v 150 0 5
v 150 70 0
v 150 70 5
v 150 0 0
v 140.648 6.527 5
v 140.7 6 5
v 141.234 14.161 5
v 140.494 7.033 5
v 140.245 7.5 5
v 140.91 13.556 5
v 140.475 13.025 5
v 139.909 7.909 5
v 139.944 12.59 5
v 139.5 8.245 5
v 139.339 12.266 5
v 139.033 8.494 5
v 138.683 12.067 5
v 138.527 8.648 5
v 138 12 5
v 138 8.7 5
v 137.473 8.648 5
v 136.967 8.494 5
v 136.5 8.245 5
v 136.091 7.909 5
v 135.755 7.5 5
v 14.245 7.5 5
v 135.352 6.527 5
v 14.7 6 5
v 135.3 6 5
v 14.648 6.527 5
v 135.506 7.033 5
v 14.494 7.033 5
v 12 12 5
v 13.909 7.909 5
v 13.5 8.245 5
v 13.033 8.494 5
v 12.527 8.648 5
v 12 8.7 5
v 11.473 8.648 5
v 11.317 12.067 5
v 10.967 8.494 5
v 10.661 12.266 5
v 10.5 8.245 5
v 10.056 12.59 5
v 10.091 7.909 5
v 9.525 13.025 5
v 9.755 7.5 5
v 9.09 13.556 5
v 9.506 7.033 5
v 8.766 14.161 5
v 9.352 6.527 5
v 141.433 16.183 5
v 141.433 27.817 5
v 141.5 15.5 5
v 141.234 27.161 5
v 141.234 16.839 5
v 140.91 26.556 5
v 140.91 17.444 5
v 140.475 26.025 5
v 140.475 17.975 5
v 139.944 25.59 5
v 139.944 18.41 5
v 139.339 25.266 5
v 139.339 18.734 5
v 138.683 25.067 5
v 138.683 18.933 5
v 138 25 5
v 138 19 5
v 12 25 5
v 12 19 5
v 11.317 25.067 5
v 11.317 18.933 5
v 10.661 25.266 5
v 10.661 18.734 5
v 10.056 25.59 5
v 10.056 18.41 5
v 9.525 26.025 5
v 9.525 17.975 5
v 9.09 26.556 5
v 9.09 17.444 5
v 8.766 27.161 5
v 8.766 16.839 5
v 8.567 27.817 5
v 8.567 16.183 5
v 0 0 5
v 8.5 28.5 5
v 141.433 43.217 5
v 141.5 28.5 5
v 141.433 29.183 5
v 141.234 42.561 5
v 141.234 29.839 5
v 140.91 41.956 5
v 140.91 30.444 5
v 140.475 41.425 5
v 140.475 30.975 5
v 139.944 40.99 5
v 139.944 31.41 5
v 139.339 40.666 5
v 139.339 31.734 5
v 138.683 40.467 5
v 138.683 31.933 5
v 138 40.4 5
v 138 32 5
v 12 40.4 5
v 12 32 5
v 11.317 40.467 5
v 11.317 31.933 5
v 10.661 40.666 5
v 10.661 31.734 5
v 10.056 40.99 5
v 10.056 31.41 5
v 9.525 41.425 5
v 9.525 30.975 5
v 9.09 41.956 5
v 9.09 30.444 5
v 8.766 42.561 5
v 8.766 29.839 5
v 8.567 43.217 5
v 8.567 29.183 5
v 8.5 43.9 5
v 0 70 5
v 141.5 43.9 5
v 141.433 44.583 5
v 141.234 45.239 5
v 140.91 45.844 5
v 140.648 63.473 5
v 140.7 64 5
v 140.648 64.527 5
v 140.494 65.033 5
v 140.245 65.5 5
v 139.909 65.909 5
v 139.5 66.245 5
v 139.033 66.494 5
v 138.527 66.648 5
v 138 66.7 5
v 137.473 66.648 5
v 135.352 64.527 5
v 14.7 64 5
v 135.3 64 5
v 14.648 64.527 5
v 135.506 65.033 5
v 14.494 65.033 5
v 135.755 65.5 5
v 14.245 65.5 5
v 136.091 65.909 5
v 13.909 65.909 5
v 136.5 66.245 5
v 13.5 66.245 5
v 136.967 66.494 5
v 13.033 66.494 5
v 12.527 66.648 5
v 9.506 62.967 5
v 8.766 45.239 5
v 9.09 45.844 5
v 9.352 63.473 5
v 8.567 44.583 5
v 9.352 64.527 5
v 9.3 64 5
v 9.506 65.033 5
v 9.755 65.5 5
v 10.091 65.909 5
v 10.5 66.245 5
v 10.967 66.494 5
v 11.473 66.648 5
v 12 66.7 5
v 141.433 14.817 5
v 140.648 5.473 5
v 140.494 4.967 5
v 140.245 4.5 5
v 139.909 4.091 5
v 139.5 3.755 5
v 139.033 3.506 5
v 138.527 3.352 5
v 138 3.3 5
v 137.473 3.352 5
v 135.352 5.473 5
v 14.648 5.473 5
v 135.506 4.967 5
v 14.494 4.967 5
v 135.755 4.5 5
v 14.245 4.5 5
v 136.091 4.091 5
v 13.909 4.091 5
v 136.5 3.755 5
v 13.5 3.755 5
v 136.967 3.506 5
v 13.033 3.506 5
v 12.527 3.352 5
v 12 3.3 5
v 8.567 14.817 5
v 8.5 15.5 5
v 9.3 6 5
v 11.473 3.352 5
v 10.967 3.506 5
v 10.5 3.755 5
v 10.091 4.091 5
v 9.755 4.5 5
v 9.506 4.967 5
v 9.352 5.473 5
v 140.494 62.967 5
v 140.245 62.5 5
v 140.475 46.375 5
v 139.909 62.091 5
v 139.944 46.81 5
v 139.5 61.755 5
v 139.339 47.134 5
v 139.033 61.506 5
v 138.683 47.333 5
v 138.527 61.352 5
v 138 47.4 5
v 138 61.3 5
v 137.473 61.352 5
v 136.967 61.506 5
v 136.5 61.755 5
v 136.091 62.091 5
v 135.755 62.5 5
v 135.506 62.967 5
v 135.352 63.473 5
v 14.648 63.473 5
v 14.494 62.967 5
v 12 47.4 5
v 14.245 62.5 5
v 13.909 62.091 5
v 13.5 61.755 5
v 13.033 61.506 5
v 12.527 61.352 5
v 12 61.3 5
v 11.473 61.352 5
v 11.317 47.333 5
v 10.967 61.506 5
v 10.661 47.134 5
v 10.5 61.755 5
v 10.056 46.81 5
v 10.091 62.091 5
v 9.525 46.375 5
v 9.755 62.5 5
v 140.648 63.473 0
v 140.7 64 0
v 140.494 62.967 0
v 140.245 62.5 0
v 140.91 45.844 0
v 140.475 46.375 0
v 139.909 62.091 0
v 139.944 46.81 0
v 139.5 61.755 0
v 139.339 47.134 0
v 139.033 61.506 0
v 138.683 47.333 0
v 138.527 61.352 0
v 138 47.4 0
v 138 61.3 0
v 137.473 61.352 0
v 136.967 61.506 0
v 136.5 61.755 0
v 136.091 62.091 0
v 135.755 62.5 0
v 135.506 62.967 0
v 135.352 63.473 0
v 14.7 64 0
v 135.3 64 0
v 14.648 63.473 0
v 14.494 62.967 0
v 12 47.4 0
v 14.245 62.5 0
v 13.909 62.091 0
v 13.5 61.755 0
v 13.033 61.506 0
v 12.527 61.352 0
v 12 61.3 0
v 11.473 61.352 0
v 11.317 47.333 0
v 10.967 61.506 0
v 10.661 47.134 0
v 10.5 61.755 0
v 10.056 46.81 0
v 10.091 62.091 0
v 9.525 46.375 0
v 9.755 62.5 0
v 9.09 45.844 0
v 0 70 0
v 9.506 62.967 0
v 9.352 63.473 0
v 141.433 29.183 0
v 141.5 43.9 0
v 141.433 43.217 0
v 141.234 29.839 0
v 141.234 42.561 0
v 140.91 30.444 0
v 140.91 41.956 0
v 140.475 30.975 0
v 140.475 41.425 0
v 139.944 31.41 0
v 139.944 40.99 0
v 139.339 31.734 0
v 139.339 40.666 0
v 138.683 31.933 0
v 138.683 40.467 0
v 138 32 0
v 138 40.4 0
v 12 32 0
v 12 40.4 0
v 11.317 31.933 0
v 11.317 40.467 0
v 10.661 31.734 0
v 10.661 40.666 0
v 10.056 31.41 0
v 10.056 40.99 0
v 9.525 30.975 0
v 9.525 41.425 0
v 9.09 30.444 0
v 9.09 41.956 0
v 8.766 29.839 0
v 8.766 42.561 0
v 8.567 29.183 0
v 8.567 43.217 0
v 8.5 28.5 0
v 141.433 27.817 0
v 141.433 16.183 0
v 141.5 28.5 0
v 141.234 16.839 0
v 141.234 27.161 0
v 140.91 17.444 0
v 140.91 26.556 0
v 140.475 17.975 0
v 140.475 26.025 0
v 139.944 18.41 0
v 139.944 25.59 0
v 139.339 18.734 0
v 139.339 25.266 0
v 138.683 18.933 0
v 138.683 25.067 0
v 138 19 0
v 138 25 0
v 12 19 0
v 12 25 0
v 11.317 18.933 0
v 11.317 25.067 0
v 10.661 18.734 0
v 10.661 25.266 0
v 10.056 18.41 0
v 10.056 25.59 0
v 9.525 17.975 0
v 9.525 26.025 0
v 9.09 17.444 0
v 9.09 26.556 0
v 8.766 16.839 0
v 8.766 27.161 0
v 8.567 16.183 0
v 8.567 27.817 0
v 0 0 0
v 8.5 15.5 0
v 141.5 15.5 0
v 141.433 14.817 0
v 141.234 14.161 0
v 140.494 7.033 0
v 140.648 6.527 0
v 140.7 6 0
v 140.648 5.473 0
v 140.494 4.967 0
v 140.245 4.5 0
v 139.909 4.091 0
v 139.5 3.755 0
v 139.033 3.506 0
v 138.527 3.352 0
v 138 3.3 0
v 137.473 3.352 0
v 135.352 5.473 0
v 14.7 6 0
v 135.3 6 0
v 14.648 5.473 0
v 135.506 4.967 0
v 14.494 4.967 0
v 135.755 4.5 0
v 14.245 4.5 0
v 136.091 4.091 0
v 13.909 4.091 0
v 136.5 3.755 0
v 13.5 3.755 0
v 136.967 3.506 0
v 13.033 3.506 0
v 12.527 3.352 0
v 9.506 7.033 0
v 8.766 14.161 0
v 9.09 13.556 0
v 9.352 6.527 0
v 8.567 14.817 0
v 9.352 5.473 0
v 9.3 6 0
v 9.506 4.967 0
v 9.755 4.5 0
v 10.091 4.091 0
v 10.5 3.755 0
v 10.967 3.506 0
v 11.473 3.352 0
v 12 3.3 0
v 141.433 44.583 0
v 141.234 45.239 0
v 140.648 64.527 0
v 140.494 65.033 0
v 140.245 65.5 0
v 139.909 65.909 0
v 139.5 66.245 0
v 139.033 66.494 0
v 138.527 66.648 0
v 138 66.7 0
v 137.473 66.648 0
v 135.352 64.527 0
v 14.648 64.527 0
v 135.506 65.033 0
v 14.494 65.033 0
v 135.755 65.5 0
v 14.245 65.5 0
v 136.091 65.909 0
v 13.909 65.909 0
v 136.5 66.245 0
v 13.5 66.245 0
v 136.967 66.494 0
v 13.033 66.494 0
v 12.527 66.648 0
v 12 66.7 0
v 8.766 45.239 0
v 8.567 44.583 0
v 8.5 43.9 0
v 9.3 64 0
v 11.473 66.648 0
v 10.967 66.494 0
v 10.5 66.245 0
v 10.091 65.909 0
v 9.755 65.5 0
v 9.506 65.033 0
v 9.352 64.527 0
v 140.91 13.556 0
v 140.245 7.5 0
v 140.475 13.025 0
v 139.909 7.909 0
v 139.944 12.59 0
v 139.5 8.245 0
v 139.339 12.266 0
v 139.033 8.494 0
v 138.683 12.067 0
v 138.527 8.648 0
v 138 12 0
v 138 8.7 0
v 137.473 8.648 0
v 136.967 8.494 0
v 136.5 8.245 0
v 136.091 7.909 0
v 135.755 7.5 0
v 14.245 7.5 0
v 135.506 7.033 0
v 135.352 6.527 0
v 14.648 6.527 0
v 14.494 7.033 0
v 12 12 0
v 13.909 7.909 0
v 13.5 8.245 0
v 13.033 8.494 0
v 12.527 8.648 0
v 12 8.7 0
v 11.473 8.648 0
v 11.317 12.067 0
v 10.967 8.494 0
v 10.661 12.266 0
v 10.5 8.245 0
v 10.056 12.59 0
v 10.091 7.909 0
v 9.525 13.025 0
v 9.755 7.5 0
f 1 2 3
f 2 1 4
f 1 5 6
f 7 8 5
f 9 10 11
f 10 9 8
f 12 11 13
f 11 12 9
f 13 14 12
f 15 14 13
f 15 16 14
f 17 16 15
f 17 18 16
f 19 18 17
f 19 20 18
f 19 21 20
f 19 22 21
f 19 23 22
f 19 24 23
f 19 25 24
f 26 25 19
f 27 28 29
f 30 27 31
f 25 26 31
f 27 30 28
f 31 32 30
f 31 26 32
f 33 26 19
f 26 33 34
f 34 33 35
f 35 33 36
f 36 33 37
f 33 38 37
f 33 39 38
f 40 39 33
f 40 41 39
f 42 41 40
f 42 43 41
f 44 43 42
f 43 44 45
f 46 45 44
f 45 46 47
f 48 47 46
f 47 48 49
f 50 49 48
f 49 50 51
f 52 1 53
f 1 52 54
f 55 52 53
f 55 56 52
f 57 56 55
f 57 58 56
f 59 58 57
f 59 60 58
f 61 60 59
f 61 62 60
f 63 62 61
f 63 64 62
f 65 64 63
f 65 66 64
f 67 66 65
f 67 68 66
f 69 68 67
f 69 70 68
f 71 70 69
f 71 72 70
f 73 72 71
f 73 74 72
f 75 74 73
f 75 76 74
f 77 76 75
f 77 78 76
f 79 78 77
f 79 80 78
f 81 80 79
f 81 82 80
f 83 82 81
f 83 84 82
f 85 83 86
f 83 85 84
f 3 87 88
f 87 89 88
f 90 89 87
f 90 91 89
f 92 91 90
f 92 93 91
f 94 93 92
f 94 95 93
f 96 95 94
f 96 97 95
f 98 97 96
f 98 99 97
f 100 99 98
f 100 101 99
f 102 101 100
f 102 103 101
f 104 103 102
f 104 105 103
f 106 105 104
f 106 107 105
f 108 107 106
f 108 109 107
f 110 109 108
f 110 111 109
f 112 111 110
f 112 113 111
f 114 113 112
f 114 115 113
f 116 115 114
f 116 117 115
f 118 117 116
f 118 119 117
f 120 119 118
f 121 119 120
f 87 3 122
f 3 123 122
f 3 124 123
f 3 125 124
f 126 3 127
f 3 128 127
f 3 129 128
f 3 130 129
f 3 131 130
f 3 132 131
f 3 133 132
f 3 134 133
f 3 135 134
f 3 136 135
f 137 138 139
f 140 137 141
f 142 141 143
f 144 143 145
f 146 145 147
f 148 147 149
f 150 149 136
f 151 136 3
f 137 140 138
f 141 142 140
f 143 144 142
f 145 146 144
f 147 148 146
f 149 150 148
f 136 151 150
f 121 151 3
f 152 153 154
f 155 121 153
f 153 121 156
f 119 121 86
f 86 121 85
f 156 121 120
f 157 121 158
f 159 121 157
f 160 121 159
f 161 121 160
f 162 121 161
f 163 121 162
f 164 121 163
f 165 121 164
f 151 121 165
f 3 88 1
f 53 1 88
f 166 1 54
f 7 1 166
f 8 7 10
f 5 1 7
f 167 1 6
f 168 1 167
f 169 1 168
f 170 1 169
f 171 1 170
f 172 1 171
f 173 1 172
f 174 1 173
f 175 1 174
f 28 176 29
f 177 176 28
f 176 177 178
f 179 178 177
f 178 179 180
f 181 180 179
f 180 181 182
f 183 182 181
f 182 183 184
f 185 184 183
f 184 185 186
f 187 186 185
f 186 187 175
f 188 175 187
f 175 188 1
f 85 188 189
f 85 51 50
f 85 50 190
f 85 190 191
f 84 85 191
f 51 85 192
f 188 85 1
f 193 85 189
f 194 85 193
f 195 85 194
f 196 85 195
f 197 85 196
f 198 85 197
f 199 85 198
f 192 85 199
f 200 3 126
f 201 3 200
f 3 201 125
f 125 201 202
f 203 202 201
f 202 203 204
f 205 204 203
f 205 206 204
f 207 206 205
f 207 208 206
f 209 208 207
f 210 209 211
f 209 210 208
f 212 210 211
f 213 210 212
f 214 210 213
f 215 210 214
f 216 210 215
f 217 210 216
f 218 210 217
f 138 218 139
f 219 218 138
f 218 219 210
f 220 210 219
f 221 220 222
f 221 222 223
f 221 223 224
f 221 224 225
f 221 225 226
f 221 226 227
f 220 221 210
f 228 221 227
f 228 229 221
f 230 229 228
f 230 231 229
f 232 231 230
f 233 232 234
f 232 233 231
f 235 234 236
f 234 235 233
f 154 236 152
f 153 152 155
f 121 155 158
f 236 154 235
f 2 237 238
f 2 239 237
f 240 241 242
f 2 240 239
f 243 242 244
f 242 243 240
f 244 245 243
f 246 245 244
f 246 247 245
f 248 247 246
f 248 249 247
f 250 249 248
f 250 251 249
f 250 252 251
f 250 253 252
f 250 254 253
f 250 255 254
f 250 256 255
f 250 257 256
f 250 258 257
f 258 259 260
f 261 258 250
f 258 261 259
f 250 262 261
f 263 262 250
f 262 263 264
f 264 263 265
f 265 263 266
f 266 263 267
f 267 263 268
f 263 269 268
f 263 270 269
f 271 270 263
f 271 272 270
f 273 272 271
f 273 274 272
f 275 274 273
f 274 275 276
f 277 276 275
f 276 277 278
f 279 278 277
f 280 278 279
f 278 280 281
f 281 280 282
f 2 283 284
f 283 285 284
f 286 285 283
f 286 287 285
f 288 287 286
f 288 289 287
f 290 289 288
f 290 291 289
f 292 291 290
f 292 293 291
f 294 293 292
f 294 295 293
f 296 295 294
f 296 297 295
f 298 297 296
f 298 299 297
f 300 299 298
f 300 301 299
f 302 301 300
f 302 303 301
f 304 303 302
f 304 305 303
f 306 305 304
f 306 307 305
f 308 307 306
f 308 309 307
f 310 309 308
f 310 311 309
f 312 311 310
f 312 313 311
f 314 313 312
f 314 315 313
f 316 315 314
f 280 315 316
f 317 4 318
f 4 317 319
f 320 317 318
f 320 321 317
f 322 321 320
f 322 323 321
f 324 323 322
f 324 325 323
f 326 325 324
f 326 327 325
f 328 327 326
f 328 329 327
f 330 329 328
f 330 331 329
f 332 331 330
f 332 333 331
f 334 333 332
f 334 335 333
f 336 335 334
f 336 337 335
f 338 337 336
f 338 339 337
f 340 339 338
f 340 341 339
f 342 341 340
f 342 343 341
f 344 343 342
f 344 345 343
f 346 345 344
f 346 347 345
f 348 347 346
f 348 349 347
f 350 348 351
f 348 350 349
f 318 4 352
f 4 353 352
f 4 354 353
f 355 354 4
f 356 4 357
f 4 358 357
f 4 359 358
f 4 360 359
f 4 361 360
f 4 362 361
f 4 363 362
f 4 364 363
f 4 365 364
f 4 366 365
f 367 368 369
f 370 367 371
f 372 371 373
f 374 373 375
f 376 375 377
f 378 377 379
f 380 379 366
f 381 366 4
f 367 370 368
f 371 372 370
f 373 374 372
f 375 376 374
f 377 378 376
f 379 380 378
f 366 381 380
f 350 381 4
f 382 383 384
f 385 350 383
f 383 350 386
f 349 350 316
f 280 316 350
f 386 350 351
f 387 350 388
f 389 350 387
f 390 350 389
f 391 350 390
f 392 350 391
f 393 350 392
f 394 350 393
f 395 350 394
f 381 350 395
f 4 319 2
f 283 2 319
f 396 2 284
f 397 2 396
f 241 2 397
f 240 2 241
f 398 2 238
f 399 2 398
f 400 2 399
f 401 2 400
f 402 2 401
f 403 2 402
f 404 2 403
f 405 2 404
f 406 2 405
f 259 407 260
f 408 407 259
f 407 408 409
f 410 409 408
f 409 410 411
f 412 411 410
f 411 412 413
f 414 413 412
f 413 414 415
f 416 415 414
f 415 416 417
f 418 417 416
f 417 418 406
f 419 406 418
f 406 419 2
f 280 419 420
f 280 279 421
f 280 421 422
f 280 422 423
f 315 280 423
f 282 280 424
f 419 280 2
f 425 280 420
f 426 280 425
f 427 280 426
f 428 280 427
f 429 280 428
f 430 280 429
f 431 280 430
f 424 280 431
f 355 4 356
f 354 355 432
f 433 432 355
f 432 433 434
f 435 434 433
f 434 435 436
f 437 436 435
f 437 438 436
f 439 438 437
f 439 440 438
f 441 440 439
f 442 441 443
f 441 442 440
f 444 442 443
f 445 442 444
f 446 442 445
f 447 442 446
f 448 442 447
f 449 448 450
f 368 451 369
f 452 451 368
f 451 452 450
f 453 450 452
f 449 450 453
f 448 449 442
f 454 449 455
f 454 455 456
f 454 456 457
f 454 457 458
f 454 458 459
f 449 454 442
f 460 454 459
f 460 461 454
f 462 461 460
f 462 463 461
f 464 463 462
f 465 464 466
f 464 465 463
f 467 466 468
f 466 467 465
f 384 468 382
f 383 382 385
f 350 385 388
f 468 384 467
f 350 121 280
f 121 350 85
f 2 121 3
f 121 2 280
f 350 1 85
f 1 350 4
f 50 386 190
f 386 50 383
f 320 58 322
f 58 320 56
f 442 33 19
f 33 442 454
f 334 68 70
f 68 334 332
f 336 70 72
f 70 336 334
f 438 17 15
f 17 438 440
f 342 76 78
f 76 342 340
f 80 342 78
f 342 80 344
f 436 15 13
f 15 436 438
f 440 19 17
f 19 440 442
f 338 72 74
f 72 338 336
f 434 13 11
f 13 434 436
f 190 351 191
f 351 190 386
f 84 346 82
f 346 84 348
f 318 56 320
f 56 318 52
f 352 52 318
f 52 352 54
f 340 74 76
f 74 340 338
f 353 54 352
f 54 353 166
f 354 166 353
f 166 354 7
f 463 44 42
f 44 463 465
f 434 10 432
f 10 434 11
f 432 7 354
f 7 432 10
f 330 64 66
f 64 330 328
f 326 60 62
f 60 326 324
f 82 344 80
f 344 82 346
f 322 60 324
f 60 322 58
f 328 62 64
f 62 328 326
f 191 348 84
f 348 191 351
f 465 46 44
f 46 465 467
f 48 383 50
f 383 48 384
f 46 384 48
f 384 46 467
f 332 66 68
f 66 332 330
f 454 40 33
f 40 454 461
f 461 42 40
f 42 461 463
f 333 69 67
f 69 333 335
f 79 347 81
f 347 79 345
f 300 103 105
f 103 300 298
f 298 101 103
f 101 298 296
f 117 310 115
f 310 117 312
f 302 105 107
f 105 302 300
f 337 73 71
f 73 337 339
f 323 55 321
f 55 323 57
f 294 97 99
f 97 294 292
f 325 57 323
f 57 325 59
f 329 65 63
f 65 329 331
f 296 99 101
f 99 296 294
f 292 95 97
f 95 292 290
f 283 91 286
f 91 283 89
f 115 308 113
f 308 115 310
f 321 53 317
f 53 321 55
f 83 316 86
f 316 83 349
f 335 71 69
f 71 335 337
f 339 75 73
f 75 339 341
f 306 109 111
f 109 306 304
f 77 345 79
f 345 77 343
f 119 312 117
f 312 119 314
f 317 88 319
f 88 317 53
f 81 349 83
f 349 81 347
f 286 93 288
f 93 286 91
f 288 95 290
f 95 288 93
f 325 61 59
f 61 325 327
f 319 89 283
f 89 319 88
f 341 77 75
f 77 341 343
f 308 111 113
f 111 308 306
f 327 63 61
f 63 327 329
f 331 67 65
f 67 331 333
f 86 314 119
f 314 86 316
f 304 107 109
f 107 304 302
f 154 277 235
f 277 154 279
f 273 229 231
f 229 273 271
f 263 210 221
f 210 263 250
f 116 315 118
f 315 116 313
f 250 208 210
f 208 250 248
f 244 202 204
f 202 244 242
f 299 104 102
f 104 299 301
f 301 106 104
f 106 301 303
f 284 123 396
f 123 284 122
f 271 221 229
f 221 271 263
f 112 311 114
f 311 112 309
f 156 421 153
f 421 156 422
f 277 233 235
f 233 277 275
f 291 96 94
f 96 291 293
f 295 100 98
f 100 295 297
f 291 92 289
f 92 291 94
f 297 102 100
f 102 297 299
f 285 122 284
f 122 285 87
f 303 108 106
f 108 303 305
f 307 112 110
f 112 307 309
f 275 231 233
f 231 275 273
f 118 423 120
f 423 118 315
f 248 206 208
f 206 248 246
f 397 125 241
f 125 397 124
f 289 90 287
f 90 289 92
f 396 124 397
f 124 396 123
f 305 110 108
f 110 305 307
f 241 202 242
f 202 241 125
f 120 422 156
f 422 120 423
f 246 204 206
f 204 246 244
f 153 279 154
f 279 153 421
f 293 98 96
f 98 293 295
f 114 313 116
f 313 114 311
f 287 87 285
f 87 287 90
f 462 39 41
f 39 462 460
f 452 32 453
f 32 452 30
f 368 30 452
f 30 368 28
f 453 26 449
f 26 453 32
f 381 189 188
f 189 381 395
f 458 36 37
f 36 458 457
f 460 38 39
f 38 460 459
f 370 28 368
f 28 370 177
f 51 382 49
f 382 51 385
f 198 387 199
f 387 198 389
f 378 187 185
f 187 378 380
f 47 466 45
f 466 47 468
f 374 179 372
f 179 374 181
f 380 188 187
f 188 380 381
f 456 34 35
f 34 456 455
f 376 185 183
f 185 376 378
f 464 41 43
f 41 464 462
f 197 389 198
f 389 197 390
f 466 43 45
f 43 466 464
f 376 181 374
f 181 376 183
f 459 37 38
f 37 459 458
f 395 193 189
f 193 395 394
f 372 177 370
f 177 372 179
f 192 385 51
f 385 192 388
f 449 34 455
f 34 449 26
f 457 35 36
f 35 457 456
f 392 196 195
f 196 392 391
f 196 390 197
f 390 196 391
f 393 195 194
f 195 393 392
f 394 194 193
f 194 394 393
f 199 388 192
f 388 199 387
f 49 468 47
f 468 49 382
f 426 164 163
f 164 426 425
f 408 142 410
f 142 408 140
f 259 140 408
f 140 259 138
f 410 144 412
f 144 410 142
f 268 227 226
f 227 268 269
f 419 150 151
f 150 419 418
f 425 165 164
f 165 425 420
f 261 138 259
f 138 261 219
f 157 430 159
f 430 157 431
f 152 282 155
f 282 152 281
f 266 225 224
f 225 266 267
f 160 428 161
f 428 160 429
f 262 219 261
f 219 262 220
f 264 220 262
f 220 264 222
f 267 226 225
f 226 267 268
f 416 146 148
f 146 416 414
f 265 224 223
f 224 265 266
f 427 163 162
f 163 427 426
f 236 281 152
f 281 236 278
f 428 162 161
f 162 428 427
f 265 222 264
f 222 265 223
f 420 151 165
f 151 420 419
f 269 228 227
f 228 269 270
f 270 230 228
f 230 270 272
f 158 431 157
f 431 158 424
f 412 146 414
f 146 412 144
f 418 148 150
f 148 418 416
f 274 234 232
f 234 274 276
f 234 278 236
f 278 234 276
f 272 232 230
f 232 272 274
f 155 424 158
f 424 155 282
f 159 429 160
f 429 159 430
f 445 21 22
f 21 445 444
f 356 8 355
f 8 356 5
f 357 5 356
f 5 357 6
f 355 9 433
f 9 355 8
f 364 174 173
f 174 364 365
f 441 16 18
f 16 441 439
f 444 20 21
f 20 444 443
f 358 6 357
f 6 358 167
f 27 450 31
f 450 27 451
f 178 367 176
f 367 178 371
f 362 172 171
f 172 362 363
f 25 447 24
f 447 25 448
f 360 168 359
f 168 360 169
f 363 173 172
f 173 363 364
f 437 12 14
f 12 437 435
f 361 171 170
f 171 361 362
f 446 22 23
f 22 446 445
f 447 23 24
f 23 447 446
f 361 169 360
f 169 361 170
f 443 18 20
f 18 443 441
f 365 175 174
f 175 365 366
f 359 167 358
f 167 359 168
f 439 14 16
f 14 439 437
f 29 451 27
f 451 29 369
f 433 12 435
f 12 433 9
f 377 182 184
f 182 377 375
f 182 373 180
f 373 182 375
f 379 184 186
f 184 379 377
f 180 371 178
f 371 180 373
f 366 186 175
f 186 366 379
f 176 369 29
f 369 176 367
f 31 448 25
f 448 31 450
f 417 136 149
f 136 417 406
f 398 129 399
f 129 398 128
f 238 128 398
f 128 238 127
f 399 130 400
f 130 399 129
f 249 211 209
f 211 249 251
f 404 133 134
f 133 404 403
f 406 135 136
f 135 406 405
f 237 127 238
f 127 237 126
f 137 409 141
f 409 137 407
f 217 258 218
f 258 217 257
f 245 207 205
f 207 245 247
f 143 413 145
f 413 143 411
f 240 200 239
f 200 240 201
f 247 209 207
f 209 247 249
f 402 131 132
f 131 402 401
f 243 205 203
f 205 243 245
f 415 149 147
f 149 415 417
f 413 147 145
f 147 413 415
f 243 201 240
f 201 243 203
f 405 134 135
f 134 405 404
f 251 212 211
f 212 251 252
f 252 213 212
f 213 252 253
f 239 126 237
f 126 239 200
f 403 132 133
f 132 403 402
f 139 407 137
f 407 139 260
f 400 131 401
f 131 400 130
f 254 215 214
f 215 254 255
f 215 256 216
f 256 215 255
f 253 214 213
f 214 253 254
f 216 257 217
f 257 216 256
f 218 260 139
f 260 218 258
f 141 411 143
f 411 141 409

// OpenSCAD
$fn = 32;

// ----------------------------------------------------------------------
// Slotted panel: 150 x 70 mm, 3 ряда of slots
// ----------------------------------------------------------------------

// --- parameters (mm) ---
panel_w = 150;            // panel width
panel_d = 70;             // panel depth
thick = 5;                // panel thickness
slot_w = 7;               // slot width
pitch0 = 13;              // first row pitch
pitch_step = 2.4;         // pitch increase per row
margin = 12;              // margin around the slot field
rows = 3;                 // number of slot rows
mount_d = 5.4;            // mounting holes
mount_x = 63;             // mounting hole offset

difference() {
  union() {
    cube([panel_w, panel_d, thick]);
  }
  /* slot rows: stadium shaped cutters, 2.5 mm clear of both faces */
  /* row 0: pitch 13, length 126 */
  hull() {
    translate([12, 15.5, -2.5]) cylinder(h = thick + 5, d = slot_w);
    translate([138, 15.5, -2.5]) cylinder(h = thick + 5, d = slot_w);
  }
  /* row 1: pitch 15.4, length 126 */
  hull() {
    translate([12, 28.5, -2.5]) cylinder(h = thick + 5, d = slot_w);
    translate([138, 28.5, -2.5]) cylinder(h = thick + 5, d = slot_w);
  }
  /* row 2: pitch 13, length 126 */
  hull() {
    translate([12, 43.9, -2.5]) cylinder(h = thick + 5, d = slot_w);
    translate([138, 43.9, -2.5]) cylinder(h = thick + 5, d = slot_w);
  }
  translate([12, 6, -2.5]) cylinder(h = 10, d = mount_d);
  translate([12, 64, -2.5]) cylinder(h = 10, d = mount_d);
  translate([138, 6, -2.5]) cylinder(h = 10, d = mount_d);
  translate([138, 64, -2.5]) cylinder(h = 10, d = mount_d);
}
